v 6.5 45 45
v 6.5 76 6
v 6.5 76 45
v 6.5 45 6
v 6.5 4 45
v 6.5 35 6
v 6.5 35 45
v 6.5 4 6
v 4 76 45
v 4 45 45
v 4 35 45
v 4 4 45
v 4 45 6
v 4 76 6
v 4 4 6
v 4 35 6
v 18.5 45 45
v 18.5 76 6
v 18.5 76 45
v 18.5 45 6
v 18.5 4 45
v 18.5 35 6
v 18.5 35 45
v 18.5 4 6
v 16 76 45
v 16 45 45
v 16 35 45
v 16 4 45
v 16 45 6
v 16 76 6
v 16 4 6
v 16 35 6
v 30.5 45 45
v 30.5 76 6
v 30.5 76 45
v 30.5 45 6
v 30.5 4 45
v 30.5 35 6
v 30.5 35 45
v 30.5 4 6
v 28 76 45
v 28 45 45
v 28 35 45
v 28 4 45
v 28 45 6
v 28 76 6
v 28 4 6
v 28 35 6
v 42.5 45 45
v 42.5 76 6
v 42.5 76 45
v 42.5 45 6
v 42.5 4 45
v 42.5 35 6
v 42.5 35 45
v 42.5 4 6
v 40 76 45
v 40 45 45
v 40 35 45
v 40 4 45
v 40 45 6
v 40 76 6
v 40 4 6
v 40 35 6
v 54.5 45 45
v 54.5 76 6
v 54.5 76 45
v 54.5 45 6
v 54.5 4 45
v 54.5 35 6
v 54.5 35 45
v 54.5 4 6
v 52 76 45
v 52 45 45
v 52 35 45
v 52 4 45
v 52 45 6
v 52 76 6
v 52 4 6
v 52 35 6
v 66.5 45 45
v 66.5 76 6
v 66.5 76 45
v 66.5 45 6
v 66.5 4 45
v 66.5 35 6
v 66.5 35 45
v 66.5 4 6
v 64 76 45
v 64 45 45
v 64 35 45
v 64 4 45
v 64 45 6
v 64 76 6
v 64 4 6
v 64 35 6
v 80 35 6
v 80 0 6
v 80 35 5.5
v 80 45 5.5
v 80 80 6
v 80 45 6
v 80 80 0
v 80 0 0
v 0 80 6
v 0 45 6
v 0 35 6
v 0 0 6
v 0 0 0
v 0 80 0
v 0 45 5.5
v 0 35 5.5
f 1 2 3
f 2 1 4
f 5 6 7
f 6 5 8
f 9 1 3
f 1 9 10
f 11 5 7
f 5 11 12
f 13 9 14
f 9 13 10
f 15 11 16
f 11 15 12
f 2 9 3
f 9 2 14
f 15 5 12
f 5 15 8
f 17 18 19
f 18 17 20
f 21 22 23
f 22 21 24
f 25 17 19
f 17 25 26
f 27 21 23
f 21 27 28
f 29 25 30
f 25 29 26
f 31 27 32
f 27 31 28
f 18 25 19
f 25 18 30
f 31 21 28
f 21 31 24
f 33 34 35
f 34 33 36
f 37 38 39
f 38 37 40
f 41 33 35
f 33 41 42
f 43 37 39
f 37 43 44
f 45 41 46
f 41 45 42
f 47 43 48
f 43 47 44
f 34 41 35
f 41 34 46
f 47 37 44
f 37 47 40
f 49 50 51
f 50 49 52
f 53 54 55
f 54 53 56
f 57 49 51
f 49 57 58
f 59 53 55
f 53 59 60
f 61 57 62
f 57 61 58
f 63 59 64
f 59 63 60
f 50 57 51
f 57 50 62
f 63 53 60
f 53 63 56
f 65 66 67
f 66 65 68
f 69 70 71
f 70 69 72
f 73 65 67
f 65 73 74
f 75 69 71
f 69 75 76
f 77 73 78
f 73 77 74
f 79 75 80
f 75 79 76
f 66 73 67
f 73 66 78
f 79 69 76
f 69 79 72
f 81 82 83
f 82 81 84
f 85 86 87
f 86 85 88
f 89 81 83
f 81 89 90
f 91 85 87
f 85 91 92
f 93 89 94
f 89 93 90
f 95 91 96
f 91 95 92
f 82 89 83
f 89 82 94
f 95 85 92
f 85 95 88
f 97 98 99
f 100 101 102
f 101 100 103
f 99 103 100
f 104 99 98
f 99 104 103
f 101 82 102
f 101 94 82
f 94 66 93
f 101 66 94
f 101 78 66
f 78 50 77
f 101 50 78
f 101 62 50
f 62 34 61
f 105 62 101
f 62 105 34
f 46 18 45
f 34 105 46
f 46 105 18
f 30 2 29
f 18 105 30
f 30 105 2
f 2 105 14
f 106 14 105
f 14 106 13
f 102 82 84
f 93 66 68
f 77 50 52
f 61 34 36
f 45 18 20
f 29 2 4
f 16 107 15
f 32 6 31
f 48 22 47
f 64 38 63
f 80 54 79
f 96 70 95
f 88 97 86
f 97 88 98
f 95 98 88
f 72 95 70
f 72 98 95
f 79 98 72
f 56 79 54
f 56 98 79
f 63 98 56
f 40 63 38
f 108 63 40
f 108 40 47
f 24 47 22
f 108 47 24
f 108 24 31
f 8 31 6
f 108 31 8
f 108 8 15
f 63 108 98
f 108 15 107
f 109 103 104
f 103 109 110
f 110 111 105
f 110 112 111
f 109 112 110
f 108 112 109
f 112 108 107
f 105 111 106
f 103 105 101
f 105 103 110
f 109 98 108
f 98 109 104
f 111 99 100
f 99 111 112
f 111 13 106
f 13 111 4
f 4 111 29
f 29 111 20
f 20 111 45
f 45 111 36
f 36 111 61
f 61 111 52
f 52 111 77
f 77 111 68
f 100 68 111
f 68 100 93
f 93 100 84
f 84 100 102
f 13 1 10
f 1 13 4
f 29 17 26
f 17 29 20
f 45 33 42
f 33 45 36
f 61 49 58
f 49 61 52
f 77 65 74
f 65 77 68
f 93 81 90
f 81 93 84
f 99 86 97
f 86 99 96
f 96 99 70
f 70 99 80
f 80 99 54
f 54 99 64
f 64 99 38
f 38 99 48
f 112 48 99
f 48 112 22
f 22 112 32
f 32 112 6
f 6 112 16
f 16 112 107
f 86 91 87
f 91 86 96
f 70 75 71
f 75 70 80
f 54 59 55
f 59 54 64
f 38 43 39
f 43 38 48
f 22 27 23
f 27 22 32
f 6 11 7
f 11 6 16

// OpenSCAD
$fn = 32;

// ----------------------------------------------------------------------
// Heatsink: slotted fin block
// ----------------------------------------------------------------------

// --- parameters (mm) ---
base_l = 80;              // base length, X
base_w = 80;              // base width, Y
base_t = 6;               // base plate thickness
fin_h = 40;               // fin height above the base
fin_t = 2.5;              // fin thickness
edge = 4;                 // margin from the base ends
pitch = 12;               // fin pitch
slot_w = 10;              // central slot width, Y

n_fins = floor((base_l - 2 * edge - fin_t) / pitch) + 1;  // fin count
total_h = base_t + fin_h - 1;  // overall height

difference() {
union() {
  cube([base_l, base_w, base_t]);
  for (i = [0 : n_fins - 1])
    translate([edge + i * pitch, edge, base_t - 1])
      cube([fin_t, base_w - 2 * edge, fin_h]);
}
  translate([-1, base_w / 2 - slot_w / 2, base_t - 0.5])
    cube([base_l + 2, slot_w, fin_h + 2]);
}
